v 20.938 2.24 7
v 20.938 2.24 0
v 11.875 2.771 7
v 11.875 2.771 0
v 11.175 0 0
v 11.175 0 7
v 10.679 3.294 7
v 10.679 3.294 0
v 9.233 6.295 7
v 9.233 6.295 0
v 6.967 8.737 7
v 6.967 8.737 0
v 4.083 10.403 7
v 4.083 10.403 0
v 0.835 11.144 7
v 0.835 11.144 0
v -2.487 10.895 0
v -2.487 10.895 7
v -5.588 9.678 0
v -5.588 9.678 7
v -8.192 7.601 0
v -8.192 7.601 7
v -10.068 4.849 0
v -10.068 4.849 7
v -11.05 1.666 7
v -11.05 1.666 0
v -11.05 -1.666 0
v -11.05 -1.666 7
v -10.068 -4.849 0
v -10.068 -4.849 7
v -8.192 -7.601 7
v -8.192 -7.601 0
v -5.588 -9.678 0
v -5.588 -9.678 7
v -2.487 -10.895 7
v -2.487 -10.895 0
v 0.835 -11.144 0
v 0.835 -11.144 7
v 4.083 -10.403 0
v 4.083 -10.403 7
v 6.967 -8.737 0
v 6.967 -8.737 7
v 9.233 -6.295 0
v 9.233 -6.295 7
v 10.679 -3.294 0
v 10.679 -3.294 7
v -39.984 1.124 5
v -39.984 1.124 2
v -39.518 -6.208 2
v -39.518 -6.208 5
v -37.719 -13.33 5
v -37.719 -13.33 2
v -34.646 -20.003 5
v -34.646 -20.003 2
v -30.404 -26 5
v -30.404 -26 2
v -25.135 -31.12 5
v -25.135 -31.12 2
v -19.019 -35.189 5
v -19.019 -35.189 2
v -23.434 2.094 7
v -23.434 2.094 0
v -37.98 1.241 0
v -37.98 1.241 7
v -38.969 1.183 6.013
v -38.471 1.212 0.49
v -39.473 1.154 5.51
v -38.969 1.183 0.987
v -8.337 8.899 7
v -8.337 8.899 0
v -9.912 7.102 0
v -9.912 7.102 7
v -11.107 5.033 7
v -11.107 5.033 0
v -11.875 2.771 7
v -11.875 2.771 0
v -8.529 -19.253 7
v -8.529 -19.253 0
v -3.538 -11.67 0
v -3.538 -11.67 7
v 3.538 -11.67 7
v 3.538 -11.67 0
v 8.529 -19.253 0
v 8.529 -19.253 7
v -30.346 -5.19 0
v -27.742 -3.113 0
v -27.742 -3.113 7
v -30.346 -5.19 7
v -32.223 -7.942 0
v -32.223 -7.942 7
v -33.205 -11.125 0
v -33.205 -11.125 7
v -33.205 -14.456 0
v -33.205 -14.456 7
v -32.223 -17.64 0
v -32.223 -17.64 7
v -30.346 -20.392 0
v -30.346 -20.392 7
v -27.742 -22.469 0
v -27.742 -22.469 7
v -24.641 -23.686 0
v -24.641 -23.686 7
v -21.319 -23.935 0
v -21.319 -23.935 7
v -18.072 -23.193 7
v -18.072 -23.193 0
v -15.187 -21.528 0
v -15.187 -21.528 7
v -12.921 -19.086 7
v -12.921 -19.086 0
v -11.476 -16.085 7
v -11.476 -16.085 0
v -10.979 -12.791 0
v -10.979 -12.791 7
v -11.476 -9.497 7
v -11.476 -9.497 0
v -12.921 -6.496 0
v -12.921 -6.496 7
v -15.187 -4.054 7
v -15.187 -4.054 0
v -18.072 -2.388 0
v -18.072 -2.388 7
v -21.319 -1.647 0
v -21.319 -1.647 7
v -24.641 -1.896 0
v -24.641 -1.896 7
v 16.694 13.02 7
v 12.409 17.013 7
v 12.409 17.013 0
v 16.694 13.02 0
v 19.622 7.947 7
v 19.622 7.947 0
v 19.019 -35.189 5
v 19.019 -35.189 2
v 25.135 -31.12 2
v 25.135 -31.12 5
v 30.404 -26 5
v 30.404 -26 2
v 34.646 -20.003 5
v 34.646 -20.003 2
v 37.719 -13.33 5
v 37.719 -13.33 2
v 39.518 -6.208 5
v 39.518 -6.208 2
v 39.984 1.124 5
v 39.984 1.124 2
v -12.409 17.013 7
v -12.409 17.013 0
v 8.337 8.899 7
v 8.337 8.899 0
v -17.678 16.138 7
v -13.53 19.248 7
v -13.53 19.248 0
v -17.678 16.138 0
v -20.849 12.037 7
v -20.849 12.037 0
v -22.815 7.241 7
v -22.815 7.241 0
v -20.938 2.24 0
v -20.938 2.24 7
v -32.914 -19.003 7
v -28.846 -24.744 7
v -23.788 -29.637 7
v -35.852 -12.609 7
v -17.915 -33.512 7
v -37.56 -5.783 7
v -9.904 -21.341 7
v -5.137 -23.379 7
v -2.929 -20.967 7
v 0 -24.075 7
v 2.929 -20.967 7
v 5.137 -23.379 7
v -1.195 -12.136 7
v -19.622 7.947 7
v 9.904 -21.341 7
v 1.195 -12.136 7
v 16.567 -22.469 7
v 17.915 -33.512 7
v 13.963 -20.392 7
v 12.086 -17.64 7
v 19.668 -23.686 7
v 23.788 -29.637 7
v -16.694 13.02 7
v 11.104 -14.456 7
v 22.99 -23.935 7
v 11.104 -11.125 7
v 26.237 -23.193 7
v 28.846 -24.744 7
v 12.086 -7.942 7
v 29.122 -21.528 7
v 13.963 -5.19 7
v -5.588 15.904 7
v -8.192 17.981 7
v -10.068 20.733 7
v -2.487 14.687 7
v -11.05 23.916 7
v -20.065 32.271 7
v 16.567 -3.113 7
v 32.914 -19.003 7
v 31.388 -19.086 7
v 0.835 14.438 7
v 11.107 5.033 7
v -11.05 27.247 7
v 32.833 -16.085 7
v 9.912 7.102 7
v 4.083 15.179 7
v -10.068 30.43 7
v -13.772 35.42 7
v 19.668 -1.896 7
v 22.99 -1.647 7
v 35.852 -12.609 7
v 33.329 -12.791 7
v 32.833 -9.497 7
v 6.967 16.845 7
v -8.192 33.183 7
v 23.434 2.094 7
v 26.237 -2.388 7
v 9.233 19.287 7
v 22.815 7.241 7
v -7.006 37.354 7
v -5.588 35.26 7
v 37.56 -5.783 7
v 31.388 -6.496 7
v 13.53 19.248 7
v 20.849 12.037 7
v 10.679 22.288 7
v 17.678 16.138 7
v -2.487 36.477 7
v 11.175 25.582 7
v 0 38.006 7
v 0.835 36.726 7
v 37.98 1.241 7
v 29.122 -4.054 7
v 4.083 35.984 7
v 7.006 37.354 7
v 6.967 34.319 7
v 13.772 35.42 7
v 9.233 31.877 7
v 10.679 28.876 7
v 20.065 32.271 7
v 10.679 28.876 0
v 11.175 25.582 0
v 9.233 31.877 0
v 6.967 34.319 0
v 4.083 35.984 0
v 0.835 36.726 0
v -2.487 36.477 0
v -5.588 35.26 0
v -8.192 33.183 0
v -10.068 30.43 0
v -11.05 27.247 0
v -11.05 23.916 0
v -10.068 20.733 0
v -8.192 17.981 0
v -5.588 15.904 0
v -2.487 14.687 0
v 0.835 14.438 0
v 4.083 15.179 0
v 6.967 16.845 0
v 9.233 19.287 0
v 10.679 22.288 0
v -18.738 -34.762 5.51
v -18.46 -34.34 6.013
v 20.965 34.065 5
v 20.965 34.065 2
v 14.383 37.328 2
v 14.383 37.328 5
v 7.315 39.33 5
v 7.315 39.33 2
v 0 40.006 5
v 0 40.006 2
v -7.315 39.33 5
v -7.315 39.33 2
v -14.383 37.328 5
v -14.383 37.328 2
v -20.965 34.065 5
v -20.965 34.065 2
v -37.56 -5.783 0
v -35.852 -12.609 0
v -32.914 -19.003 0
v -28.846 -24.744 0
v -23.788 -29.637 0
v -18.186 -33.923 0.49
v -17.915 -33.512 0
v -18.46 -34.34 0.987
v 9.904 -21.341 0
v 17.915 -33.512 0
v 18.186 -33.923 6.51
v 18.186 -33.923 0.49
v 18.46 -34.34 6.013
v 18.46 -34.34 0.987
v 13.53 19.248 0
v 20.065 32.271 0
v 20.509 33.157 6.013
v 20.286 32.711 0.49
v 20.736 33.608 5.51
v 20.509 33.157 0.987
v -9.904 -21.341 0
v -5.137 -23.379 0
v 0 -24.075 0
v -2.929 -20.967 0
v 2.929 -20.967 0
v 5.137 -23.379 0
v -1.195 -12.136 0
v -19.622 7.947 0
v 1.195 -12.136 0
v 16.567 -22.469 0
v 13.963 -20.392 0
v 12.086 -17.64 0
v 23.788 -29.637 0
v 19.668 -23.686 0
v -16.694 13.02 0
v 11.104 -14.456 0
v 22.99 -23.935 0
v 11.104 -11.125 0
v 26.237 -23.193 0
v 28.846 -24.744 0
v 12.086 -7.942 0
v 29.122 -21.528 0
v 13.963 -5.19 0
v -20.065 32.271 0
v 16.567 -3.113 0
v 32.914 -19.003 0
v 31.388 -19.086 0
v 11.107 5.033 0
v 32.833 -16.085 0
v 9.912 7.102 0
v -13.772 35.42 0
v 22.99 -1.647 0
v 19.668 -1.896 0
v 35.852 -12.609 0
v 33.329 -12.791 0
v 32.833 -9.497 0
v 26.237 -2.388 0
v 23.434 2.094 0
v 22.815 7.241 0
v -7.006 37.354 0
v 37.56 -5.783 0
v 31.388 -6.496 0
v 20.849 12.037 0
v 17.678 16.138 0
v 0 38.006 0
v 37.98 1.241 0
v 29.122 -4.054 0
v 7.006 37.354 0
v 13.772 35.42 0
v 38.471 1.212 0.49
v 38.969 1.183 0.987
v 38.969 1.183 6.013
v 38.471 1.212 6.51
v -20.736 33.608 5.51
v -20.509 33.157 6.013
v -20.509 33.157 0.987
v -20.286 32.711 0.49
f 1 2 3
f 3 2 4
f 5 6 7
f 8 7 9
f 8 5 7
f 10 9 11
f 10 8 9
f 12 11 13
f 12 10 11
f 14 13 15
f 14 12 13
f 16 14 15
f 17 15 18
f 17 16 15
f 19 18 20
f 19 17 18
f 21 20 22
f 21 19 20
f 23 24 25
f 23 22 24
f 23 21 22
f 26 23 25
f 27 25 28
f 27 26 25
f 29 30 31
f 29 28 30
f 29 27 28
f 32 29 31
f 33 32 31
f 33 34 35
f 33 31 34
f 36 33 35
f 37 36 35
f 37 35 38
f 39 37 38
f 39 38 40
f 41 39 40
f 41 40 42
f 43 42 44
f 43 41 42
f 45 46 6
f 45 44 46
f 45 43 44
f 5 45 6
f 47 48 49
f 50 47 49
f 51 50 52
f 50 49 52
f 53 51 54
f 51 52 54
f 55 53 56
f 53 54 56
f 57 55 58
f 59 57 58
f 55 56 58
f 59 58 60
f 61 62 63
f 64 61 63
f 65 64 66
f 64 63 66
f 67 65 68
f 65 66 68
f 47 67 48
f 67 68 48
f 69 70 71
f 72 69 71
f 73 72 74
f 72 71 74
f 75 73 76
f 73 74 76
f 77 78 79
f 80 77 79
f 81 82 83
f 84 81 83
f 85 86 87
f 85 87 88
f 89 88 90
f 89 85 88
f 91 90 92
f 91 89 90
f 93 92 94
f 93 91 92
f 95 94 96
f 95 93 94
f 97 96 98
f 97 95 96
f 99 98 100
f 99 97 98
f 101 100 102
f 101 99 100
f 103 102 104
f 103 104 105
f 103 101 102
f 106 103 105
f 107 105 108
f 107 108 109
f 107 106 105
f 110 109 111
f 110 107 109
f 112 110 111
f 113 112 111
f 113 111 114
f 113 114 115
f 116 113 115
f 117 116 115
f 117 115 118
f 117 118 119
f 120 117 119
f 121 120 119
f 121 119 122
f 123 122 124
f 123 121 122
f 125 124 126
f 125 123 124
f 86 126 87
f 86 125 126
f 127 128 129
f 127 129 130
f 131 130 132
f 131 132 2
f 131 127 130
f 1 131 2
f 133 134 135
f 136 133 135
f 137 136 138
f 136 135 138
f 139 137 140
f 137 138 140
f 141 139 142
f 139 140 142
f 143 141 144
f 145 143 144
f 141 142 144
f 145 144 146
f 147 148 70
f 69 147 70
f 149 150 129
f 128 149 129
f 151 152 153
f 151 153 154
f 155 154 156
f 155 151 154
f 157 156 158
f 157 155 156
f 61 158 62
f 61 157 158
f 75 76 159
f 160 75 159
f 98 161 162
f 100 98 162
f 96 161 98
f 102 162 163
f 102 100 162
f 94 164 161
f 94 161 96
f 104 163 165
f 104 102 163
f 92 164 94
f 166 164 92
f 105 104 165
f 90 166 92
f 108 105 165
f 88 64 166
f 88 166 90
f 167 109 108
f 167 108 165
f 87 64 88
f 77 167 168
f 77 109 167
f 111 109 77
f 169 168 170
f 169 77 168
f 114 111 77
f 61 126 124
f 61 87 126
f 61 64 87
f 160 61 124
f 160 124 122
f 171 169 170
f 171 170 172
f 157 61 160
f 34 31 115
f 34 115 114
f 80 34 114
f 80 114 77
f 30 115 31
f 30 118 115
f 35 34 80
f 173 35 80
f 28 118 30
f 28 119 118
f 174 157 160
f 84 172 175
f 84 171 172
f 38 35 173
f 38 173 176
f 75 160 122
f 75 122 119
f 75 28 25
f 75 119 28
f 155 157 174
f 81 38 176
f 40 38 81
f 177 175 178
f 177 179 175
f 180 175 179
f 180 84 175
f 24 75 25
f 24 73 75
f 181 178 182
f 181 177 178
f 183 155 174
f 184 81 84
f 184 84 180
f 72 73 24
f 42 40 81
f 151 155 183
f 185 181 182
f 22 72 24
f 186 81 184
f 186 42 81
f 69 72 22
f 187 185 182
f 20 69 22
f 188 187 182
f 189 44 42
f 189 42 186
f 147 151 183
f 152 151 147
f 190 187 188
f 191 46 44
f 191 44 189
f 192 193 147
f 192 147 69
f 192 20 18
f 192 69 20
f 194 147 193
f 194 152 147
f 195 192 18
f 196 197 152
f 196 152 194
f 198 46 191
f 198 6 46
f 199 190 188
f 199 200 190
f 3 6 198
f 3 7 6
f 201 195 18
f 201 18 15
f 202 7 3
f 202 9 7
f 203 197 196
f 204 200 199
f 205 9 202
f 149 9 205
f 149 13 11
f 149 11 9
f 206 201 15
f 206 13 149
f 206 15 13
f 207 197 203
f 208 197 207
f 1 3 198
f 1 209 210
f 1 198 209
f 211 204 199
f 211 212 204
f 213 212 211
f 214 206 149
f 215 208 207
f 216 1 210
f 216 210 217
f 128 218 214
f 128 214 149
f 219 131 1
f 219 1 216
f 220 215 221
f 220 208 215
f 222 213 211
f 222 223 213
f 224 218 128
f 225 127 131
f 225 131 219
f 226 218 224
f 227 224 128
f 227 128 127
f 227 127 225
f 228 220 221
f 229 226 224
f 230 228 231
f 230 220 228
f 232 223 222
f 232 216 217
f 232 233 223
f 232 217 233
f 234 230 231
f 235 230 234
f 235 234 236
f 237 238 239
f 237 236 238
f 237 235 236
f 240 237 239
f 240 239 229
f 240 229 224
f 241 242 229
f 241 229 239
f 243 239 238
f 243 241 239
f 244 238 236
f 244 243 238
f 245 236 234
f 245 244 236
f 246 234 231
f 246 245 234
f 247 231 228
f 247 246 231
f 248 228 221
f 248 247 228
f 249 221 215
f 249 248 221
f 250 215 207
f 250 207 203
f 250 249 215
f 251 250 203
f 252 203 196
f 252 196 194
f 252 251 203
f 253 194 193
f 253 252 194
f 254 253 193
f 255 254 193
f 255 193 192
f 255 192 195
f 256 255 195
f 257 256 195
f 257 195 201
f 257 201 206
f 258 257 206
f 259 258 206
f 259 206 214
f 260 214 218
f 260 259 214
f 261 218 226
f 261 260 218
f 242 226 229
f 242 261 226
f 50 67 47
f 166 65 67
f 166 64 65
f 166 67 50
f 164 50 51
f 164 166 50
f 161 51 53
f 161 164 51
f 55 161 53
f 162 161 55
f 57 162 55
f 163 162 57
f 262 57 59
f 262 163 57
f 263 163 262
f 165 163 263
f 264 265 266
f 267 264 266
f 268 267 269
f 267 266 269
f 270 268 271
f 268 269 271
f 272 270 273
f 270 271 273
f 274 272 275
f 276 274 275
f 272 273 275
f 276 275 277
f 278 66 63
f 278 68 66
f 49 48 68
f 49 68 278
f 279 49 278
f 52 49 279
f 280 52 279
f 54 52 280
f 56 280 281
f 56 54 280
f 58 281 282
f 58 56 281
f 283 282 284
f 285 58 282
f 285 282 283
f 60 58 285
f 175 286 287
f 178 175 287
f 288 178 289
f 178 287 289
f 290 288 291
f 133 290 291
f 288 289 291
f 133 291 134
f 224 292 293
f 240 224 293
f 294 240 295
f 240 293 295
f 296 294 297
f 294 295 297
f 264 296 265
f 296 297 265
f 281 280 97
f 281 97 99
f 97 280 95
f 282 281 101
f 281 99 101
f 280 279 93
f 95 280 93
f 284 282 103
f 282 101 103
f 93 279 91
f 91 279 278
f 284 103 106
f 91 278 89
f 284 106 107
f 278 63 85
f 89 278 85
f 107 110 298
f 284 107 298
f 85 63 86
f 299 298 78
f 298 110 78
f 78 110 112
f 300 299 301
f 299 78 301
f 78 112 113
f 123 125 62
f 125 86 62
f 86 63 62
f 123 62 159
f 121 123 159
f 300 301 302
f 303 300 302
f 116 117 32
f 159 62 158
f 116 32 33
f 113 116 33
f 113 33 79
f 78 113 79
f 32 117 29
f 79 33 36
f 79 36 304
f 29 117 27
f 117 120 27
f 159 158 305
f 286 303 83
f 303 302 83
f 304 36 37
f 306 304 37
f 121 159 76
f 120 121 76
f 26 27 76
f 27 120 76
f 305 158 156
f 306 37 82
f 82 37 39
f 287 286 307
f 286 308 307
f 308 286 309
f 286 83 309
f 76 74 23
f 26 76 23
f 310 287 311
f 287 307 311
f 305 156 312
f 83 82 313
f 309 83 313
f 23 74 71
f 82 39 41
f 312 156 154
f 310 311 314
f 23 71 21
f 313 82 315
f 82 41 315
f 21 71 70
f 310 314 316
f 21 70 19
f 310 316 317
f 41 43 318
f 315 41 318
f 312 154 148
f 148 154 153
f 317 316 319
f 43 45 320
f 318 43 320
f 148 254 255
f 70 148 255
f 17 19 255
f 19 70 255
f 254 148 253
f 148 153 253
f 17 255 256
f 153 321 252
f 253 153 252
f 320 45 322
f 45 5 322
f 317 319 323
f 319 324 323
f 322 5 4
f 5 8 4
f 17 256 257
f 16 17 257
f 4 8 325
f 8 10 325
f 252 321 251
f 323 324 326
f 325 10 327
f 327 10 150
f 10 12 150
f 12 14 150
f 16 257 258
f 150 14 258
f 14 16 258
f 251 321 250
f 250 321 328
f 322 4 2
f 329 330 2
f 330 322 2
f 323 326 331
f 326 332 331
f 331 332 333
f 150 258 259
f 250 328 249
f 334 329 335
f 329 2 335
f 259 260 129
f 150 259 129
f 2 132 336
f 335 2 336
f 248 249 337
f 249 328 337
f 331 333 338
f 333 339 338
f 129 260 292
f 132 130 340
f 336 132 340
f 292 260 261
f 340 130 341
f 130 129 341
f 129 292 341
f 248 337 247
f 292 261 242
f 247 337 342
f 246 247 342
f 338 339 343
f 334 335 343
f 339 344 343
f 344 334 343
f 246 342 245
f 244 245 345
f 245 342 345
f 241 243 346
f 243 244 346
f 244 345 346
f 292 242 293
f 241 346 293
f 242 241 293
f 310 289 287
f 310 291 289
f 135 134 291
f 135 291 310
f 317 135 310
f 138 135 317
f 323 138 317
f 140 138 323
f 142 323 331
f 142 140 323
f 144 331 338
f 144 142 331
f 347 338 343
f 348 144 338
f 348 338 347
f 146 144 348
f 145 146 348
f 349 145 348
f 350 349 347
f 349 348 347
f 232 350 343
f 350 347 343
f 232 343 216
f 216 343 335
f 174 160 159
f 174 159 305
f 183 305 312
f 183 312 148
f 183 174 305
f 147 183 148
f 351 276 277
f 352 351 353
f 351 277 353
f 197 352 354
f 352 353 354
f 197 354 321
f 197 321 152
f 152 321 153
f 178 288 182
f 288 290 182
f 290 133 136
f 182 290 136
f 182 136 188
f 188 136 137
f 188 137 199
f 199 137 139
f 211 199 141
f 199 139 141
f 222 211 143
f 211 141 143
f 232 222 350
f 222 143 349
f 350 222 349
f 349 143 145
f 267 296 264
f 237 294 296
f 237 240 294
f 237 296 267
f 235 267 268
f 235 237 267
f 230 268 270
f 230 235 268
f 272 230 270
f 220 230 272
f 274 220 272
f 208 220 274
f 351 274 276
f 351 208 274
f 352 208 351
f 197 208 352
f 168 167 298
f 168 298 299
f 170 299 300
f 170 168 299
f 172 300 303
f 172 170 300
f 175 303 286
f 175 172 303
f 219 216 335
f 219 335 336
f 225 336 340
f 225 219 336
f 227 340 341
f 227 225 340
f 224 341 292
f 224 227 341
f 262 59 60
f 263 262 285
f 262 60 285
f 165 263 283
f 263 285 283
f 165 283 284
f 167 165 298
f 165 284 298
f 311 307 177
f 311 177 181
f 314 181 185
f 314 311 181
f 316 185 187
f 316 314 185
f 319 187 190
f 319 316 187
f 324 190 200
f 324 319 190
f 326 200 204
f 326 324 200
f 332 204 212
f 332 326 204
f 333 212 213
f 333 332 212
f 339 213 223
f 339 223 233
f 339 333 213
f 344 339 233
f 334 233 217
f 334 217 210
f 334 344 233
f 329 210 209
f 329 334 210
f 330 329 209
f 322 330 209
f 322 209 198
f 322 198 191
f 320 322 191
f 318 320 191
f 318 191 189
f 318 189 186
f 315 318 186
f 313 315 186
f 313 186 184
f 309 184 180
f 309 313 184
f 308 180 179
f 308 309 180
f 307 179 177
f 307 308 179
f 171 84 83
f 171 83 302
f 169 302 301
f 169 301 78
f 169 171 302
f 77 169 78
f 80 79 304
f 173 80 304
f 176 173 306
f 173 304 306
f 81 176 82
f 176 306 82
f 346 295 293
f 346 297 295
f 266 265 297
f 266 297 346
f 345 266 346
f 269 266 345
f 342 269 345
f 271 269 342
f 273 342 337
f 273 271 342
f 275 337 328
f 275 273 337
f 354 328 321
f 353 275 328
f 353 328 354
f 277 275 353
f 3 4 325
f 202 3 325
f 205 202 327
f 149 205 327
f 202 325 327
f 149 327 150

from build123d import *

# Parameters (mm, degrees)
F0_R            = 11.175
F1_DEPTH        = 7
F2_COUNT        = 3
F4_DEPTH        = 7
F4_COPIES_COUNT = 3
F5_SIZE         = 2
F6_SIZE         = 2
F7_SIZE         = 2


# Not quite as in the source:
# - a pattern or mirror of a feature is missing from the dataset's text; its kind, count and spacing are read off the source's solid


with BuildPart() as f1:
    # F0 (on Top) → F1 (new body)
    with BuildSketch(Plane.XY):
        with BuildLine():
            ThreePointArc((-8.3372222223, 8.8987877603), (-4.8493412747, -11.1884577663), (12.1941665556, 0))
            ThreePointArc((12.1941665556, 0), (11.1884577663, 4.8493412747), (8.3372222223, 8.8987877603))
            ThreePointArc((8.3372222223, 8.8987877603), (0, 12.1941665556), (-8.3372222223, 8.8987877603))
        make_face()
        Circle(F0_R, mode=Mode.SUBTRACT)
        with BuildLine():
            ThreePointArc((-8.3372222223, 8.8987877603), (0, 12.1941665556), (8.3372222223, 8.8987877603))
            Line((8.3372222223, 8.8987877603), (20.9652856439, 34.0654780954))
            ThreePointArc((20.9652856439, 34.0654780954), (0, 40.0055861953), (-20.9652856439, 34.0654780954))
            Line((-20.9652856439, 34.0654780954), (-8.3372222223, 8.8987877603))
        make_face()
        with Locations((0, 25.5817994475)):
            Circle(F0_R, mode=Mode.SUBTRACT)
    extrude(amount=F1_DEPTH)

    # F2: F1 ×3 about axis
    f2_axis = Axis((0, 0, 0), (0, 0, -1))


with BuildPart() as f1_1:
    add(f1.part)
    for i in range(1, F2_COUNT):
        add(f1.part.rotate(f2_axis, i * 360 / F2_COUNT))

    # F3 (on face) → F4 (join)
    with BuildSketch(Plane.XY.offset(7)):
        with BuildLine():
            Line((-8.5294263987, -19.2529557346), (-9.9039361375, -21.3411901509))
            ThreePointArc((-9.9039361375, -21.3411901509), (0, -24.0747086913), (9.9039361375, -21.3411901509))
            Line((9.9039361375, -21.3411901509), (8.5294263987, -19.2529557346))
            ThreePointArc((8.5294263987, -19.2529557346), (0, -21.1847607817), (-8.5294263987, -19.2529557346))
        make_face()
    f4 = extrude(amount=-F4_DEPTH)

    # F4_copies: F4 ×3 about axis
    f4_copies_axis = Axis((0, 0, 0), (0, 0, 1))
    for i in range(1, F4_COPIES_COUNT):
        add(f4.rotate(f4_copies_axis, i * 360 / F4_COPIES_COUNT))

    # F5
    f5_edges = [f1_1.edges().sort_by_distance(p)[0] for p in [
        (34.645854, -20.002793, 7),
        (34.645854, -20.002793, 0),
    ]]
    chamfer(f5_edges, length=F5_SIZE)

    # F6
    f6_edges = [f1_1.edges().sort_by_distance(p)[0] for p in [
        (-34.645854, -20.002793, 7),
        (-34.645854, -20.002793, 0),
    ]]
    chamfer(f6_edges, length=F6_SIZE)

    # F7
    f7_edges = [f1_1.edges().sort_by_distance(p)[0] for p in [
        (0, 40.005586, 7),
        (0, 40.005586, 0),
    ]]
    chamfer(f7_edges, length=F7_SIZE)


solid = f1_1.part
